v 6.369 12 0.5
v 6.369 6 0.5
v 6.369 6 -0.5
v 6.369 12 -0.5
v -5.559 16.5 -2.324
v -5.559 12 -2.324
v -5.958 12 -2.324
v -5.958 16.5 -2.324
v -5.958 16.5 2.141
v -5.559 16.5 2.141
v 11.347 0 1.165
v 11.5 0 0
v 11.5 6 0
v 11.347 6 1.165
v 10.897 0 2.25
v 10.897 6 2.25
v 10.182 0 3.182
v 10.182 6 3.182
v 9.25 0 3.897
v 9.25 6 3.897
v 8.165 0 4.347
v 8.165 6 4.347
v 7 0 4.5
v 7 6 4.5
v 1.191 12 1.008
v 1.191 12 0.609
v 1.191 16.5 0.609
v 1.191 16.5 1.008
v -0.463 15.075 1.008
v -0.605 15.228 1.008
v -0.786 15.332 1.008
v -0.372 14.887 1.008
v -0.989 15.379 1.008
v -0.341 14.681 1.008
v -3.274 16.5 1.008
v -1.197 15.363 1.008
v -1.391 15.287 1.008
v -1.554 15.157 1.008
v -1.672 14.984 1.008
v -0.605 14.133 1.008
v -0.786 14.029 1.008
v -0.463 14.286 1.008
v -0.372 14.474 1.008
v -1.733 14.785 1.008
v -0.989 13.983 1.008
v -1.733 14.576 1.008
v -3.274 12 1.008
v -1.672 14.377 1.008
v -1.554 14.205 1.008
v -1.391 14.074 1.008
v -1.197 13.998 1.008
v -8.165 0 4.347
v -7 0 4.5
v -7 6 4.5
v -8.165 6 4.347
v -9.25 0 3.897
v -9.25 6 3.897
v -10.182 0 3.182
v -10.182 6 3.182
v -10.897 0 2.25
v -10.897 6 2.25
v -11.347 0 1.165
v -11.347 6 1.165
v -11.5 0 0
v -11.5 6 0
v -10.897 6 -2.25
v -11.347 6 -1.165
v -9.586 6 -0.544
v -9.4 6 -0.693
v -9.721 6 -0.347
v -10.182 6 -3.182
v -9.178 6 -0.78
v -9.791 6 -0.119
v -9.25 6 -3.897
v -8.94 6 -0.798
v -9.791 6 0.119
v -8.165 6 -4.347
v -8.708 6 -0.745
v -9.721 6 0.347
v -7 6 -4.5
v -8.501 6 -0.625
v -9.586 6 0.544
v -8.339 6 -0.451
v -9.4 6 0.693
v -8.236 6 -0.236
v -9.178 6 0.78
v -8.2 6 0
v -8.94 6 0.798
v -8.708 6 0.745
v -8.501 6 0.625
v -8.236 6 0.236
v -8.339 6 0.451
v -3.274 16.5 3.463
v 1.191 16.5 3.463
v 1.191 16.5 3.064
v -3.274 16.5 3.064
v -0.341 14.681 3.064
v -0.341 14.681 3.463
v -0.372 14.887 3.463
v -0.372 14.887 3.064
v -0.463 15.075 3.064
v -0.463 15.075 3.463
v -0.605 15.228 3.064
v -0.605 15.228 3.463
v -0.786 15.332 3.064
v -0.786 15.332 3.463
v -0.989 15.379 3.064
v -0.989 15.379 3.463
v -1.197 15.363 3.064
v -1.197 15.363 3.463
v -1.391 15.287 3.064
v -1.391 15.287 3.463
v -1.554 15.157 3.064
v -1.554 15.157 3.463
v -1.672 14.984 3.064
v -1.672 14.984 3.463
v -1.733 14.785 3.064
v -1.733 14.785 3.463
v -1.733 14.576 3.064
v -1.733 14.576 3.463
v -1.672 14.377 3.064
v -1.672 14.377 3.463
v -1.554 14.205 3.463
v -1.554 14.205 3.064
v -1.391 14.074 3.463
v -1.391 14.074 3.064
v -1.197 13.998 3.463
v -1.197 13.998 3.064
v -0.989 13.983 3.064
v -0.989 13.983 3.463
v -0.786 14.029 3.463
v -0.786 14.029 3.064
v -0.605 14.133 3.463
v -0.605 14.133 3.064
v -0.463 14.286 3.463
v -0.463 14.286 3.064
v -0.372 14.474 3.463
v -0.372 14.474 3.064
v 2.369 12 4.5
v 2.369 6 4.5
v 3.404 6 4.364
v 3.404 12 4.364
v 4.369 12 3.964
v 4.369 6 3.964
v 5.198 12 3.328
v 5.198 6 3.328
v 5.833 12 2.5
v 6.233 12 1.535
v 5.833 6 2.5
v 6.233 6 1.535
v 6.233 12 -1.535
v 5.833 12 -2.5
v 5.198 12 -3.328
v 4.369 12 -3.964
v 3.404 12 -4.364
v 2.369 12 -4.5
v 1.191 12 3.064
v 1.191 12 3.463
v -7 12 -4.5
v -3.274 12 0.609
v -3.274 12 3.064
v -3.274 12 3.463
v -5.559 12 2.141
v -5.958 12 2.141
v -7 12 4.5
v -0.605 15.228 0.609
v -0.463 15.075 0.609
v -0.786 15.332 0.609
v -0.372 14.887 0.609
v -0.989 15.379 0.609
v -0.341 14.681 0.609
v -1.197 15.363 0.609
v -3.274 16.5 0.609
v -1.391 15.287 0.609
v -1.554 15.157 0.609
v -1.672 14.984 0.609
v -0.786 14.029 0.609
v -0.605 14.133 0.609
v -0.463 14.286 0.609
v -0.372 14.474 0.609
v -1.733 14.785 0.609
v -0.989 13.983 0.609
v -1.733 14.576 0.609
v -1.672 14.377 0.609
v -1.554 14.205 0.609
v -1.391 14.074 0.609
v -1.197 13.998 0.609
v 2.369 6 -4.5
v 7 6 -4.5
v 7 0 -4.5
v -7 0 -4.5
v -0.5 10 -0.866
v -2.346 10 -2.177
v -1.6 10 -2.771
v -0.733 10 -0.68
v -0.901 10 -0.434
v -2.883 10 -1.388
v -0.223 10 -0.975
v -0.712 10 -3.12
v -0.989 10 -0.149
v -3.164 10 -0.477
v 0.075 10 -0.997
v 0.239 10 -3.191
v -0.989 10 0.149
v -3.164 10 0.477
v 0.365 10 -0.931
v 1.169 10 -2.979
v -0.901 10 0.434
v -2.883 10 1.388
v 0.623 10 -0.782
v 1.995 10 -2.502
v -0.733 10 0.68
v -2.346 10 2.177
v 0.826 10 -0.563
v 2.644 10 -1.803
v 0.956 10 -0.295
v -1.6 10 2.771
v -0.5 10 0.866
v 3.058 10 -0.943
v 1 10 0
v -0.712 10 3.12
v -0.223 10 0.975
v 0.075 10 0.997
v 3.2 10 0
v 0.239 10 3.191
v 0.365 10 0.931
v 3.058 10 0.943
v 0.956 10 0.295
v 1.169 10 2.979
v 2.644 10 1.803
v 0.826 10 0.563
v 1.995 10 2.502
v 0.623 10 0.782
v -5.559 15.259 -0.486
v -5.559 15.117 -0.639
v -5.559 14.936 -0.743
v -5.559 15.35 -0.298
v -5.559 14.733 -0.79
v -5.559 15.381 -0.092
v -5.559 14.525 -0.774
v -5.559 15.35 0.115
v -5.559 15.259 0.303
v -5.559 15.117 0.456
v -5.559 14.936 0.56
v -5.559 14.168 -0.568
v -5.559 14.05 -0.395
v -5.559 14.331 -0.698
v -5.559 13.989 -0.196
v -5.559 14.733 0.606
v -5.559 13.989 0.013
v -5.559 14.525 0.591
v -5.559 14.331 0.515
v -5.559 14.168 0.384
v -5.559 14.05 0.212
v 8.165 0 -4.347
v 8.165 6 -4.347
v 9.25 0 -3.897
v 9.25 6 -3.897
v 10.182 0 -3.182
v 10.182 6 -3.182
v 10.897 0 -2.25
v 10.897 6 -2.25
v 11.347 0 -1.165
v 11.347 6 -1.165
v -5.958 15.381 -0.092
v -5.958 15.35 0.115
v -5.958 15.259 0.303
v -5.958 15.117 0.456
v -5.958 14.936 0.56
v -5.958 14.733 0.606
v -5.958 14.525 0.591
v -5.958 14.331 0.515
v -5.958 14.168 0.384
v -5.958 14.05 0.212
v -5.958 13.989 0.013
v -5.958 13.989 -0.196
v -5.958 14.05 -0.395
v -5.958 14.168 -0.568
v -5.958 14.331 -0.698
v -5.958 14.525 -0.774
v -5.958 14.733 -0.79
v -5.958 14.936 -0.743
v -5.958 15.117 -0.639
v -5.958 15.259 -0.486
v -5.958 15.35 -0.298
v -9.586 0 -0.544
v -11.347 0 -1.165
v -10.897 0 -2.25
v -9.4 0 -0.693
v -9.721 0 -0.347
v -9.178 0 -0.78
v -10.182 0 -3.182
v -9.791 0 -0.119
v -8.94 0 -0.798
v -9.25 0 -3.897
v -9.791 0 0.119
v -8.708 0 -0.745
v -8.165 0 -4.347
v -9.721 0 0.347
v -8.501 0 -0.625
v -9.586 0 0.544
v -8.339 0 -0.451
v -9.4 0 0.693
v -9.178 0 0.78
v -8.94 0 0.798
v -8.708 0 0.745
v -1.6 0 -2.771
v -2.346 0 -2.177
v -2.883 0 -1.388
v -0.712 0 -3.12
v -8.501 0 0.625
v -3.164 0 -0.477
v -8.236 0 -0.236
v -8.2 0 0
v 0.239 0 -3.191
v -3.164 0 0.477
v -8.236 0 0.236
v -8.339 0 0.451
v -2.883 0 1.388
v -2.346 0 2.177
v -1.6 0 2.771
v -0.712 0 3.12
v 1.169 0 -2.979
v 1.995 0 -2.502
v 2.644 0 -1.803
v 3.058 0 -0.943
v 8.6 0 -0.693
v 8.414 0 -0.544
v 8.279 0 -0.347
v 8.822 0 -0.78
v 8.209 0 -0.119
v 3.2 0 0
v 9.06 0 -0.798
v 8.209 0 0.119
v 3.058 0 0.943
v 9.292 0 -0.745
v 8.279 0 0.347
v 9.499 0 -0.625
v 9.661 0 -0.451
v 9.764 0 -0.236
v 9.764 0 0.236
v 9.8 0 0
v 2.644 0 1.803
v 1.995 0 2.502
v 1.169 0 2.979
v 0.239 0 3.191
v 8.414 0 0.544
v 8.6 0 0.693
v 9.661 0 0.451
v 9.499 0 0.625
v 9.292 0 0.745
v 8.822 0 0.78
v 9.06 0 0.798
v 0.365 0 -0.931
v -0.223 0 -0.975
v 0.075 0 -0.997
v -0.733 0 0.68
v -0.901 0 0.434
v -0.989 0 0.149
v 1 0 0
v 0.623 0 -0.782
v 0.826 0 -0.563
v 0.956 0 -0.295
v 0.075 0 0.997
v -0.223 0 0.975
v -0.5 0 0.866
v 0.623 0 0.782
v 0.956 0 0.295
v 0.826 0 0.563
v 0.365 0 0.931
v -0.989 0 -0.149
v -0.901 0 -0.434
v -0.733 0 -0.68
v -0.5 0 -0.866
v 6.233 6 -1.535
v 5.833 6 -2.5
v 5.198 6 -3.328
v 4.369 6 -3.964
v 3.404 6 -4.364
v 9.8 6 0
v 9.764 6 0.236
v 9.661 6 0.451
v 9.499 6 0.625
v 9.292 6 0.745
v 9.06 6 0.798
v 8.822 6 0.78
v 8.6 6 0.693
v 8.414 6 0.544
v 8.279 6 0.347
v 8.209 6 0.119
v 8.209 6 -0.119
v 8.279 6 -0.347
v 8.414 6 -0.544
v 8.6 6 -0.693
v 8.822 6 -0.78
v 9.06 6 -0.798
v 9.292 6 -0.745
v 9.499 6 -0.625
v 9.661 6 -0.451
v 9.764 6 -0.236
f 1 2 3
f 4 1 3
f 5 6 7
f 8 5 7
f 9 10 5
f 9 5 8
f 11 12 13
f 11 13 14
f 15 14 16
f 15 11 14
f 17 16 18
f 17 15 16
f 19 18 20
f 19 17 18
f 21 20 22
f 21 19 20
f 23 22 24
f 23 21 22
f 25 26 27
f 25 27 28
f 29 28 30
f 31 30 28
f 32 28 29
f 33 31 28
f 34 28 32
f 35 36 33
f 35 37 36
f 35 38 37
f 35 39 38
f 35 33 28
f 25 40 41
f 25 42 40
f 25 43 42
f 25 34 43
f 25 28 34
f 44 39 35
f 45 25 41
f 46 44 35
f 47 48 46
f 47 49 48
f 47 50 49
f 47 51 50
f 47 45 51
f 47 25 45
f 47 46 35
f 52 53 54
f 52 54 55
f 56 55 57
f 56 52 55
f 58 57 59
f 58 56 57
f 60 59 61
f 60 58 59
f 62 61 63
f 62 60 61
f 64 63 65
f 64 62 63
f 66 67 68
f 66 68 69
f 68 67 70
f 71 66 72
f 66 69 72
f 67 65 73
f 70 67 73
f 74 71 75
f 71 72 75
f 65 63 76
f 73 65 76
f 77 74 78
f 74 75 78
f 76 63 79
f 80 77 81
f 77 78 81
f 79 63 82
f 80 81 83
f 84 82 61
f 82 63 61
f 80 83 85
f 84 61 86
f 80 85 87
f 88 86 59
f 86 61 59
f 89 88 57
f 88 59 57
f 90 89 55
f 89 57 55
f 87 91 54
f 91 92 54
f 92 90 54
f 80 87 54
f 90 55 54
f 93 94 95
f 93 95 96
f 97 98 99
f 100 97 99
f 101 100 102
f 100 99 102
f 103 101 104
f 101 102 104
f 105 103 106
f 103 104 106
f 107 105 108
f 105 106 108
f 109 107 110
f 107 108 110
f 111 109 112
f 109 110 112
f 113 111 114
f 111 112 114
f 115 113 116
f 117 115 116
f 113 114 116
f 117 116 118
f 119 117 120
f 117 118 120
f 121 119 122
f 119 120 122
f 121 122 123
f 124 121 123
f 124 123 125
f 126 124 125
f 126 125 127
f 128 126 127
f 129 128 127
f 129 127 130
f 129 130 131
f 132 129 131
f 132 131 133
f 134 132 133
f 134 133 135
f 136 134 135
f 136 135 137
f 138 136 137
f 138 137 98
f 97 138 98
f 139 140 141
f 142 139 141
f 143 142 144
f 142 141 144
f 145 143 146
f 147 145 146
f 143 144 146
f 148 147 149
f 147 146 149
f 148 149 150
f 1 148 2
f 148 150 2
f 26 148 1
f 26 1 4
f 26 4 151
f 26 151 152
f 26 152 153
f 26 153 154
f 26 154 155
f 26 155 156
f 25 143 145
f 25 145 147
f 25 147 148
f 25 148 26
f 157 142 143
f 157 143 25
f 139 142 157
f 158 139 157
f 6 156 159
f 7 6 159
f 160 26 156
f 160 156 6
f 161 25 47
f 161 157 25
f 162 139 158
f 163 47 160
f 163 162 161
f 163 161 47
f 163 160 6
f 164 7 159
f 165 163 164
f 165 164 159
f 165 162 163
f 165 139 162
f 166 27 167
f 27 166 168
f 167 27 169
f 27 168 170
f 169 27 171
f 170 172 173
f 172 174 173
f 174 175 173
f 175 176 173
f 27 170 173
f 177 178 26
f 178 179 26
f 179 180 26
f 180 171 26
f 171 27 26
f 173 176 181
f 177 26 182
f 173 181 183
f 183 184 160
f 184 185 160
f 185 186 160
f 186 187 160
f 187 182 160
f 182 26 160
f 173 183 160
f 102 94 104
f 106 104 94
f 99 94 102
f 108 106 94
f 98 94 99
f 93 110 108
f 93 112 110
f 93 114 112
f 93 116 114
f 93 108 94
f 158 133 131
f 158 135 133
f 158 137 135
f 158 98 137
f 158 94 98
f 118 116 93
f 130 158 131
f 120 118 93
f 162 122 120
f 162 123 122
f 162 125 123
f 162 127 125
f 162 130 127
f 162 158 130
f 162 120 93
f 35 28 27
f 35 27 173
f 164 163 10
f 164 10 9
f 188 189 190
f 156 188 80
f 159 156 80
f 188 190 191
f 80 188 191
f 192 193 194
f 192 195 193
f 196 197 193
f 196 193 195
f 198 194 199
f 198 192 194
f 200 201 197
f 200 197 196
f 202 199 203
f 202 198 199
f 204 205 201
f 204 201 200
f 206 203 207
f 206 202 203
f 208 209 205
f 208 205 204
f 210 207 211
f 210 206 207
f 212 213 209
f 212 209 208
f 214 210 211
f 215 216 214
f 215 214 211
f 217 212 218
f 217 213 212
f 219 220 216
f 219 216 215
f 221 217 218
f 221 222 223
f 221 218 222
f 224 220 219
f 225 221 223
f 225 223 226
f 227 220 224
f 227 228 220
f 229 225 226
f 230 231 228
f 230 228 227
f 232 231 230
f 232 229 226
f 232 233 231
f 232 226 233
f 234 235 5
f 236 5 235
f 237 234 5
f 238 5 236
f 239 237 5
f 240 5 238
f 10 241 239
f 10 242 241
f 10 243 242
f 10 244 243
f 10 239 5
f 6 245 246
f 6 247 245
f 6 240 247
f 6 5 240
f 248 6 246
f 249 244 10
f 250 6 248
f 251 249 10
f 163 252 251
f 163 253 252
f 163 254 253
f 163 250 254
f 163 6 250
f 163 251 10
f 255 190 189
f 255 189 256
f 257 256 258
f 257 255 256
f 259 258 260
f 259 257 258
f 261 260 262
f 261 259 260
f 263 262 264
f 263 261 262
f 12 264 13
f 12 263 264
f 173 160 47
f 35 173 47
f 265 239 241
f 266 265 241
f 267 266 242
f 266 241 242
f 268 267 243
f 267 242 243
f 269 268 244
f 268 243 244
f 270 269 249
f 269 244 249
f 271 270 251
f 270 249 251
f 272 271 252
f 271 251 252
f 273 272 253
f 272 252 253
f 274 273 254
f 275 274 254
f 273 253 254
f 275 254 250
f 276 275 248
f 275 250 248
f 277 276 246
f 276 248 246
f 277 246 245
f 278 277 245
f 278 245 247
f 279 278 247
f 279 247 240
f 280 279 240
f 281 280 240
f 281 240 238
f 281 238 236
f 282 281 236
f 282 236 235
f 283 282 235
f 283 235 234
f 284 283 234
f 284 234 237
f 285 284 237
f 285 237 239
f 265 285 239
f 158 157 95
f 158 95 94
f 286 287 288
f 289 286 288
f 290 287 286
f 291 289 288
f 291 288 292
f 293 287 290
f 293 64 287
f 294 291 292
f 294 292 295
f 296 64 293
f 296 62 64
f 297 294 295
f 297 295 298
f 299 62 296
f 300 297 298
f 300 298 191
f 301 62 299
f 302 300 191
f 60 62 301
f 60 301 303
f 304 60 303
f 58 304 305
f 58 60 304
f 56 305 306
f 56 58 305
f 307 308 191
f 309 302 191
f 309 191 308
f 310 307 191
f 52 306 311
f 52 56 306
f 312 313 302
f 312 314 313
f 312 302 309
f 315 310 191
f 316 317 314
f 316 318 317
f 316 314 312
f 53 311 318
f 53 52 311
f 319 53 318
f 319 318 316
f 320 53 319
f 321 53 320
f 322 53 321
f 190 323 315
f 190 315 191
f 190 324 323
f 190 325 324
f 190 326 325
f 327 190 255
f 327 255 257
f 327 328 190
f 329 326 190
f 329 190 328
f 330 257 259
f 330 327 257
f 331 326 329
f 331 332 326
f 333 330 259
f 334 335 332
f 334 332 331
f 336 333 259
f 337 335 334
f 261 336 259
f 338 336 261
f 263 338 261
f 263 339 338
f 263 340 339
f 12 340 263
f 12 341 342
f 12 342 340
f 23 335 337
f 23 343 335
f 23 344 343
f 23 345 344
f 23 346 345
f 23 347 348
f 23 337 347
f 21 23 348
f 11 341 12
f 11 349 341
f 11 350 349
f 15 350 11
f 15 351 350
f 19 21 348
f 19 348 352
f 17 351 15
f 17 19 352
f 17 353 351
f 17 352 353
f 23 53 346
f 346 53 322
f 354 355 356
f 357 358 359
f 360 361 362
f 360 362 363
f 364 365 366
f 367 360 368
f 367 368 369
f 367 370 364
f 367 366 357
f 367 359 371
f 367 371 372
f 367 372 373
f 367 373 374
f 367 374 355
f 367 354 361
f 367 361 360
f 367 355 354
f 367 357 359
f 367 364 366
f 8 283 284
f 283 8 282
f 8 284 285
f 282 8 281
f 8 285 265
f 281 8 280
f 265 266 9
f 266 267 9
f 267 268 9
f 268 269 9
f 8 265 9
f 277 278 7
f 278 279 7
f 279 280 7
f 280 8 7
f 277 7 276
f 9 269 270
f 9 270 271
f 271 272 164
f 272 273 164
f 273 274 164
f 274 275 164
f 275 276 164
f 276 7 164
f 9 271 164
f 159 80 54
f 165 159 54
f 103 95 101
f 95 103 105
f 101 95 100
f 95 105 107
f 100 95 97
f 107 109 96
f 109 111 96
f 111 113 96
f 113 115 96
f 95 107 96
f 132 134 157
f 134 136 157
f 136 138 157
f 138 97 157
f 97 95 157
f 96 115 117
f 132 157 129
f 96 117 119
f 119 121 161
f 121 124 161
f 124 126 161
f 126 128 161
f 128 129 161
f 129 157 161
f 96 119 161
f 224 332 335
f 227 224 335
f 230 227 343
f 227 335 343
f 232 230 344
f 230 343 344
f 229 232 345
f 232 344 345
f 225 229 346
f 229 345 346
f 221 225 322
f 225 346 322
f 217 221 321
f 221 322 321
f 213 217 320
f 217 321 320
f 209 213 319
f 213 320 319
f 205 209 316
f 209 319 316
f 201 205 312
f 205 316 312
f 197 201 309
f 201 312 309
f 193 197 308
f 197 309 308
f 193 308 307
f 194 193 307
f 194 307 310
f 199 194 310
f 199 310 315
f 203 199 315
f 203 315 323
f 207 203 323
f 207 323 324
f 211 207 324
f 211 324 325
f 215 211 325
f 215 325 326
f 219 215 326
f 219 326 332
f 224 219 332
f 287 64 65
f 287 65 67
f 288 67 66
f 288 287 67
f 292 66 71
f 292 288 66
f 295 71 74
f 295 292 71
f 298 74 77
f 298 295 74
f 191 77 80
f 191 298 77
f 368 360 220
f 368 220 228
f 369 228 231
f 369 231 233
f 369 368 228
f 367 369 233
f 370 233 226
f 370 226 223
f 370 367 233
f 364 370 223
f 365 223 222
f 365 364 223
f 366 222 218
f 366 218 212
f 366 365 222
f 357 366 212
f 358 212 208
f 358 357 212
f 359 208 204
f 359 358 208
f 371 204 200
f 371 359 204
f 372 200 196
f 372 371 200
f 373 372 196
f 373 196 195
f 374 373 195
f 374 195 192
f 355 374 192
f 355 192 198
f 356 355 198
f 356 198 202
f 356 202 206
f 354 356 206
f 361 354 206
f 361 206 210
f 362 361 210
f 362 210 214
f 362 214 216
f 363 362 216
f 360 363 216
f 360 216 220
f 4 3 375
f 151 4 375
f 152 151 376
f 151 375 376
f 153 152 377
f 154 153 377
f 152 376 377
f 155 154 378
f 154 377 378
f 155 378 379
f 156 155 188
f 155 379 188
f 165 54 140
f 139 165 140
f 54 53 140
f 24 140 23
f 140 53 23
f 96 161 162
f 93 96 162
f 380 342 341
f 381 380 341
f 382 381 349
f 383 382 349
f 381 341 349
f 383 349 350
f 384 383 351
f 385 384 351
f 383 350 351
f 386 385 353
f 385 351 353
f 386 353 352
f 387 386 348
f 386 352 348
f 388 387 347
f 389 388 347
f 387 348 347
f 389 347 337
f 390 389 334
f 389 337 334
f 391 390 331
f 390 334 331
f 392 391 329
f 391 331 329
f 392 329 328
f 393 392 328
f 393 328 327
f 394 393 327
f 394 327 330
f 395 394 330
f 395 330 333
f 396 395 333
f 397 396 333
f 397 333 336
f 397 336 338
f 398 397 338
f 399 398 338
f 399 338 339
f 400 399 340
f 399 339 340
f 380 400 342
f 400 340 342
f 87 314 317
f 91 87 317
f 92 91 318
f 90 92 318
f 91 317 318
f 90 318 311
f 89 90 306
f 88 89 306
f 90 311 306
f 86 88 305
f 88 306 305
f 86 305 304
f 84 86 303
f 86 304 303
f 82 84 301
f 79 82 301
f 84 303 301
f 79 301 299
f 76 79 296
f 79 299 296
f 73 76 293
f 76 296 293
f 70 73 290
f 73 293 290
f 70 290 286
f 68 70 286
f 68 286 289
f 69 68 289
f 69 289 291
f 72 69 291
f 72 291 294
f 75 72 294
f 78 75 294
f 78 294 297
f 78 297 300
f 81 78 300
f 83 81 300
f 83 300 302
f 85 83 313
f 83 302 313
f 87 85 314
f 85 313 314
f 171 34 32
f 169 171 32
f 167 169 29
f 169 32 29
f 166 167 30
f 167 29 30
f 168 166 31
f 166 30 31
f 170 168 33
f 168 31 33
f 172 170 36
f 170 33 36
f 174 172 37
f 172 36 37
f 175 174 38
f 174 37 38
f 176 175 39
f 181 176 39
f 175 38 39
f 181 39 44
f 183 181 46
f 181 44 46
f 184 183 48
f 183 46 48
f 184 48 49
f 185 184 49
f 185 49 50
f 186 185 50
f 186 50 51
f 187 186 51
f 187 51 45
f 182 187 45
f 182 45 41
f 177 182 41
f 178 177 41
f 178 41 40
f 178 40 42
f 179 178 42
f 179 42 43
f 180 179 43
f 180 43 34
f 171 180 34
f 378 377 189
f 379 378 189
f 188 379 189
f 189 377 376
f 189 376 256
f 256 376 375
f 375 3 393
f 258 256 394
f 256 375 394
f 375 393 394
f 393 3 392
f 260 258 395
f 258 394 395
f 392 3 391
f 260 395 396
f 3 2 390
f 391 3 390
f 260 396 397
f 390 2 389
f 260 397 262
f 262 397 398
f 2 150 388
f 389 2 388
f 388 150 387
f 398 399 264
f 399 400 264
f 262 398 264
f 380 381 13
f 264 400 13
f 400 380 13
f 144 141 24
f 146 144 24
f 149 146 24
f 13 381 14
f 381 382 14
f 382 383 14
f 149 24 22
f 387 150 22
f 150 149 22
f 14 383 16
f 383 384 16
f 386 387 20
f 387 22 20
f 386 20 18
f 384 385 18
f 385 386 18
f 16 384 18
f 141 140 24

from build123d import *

# Parameters (mm, degrees)
F0_R      = 0.8
F0_R_2    = 3.2
F1_DEPTH  = 6
F3_DEPTH  = 6
F4_W      = 4.4655336533
F4_H      = 0.3993565915
F4_W_2    = 0.3993565915
F4_H_2    = 4.4655336533
F5_DEPTH  = 4.5
F6_R      = 0.7
F7_DEPTH  = 5
F8_R      = 0.7
F9_DEPTH  = 1
F0_R_3    = 1
F10_DEPTH = 10
F11_DEPTH = 10


with BuildPart() as f1:
    # F0 (on Front) → F1 (new body)
    with BuildSketch(Plane.XZ):
        with BuildLine():
            Line((-7, -4.5), (7, -4.5))
            ThreePointArc((7, -4.5), (10.1819805153, -3.1819805153), (11.5, 0))
            ThreePointArc((11.5, 0), (10.1819805153, 3.1819805153), (7, 4.5))
            Line((7, 4.5), (-7, 4.5))
            ThreePointArc((-7, 4.5), (-10.1819805153, 3.1819805153), (-11.5, 0))
            ThreePointArc((-11.5, 0), (-10.1819805153, -3.1819805153), (-7, -4.5))
        make_face()
        with Locations((-9, 0)):
            Circle(F0_R, mode=Mode.SUBTRACT)
        Circle(F0_R_2, mode=Mode.SUBTRACT)
        with Locations((9, 0)):
            Circle(F0_R, mode=Mode.SUBTRACT)
    extrude(amount=-F1_DEPTH)

    # F2 (on face) → F3 (join)
    with BuildSketch(Plane(origin=(0, 6, 0), x_dir=(-1, 0, 0), z_dir=(0, 1, 0))):
        with BuildLine():
            Line((7, 4.5), (-2.3691008836, 4.5))
            ThreePointArc((-2.3691008836, 4.5), (-5.1975280083, 3.3284271247), (-6.3691008836, 0.5))
            Line((-6.3691008836, 0.5), (-6.3691008836, -0.5))
            ThreePointArc((-6.3691008836, -0.5), (-5.1975280083, -3.3284271247), (-2.3691008836, -4.5))
            Line((-2.3691008836, -4.5), (7, -4.5))
            Line((7, -4.5), (7, 4.5))
        make_face()
    extrude(amount=F3_DEPTH)

    # F4 (on face) → F5 (join)
    with BuildSketch(Plane(origin=(0, 12, 0), x_dir=(-1, 0, 0), z_dir=(0, 1, 0))):
        with Locations((1.0412741685, 3.2637477852)):
            Rectangle(F4_W, F4_H)
        with Locations((1.0412741685, 0.8087011712)):
            Rectangle(F4_W, F4_H)
        with Locations((5.7582546142, -0.0916777644)):
            Rectangle(F4_W_2, F4_H_2)
    extrude(amount=F5_DEPTH)

    # F6 (on face) → F7 (cut)
    with BuildSketch(Plane.XY.offset(3.463426081)):
        with Locations((-1.0412741685, 14.6806975827)):
            Circle(F6_R)
    extrude(amount=-F7_DEPTH, mode=Mode.SUBTRACT)

    # F8 (on face) → F9 (cut)
    with BuildSketch(Plane.YZ.offset(-5.5585763184)):
        with Locations((14.6806975827, -0.0916777644)):
            Circle(F8_R)
    extrude(amount=-F9_DEPTH, mode=Mode.SUBTRACT)

    # F0 (on Front) → F10 (cut)
    with BuildSketch(Plane.XZ):
        Circle(F0_R_2)
        Circle(F0_R_3, mode=Mode.SUBTRACT)
    extrude(amount=-F10_DEPTH, mode=Mode.SUBTRACT)

    # F0 (on Front) → F11 (join)
    with BuildSketch(Plane.XZ):
        Circle(F0_R_3)
    extrude(amount=-F11_DEPTH)


solid = f1.part
